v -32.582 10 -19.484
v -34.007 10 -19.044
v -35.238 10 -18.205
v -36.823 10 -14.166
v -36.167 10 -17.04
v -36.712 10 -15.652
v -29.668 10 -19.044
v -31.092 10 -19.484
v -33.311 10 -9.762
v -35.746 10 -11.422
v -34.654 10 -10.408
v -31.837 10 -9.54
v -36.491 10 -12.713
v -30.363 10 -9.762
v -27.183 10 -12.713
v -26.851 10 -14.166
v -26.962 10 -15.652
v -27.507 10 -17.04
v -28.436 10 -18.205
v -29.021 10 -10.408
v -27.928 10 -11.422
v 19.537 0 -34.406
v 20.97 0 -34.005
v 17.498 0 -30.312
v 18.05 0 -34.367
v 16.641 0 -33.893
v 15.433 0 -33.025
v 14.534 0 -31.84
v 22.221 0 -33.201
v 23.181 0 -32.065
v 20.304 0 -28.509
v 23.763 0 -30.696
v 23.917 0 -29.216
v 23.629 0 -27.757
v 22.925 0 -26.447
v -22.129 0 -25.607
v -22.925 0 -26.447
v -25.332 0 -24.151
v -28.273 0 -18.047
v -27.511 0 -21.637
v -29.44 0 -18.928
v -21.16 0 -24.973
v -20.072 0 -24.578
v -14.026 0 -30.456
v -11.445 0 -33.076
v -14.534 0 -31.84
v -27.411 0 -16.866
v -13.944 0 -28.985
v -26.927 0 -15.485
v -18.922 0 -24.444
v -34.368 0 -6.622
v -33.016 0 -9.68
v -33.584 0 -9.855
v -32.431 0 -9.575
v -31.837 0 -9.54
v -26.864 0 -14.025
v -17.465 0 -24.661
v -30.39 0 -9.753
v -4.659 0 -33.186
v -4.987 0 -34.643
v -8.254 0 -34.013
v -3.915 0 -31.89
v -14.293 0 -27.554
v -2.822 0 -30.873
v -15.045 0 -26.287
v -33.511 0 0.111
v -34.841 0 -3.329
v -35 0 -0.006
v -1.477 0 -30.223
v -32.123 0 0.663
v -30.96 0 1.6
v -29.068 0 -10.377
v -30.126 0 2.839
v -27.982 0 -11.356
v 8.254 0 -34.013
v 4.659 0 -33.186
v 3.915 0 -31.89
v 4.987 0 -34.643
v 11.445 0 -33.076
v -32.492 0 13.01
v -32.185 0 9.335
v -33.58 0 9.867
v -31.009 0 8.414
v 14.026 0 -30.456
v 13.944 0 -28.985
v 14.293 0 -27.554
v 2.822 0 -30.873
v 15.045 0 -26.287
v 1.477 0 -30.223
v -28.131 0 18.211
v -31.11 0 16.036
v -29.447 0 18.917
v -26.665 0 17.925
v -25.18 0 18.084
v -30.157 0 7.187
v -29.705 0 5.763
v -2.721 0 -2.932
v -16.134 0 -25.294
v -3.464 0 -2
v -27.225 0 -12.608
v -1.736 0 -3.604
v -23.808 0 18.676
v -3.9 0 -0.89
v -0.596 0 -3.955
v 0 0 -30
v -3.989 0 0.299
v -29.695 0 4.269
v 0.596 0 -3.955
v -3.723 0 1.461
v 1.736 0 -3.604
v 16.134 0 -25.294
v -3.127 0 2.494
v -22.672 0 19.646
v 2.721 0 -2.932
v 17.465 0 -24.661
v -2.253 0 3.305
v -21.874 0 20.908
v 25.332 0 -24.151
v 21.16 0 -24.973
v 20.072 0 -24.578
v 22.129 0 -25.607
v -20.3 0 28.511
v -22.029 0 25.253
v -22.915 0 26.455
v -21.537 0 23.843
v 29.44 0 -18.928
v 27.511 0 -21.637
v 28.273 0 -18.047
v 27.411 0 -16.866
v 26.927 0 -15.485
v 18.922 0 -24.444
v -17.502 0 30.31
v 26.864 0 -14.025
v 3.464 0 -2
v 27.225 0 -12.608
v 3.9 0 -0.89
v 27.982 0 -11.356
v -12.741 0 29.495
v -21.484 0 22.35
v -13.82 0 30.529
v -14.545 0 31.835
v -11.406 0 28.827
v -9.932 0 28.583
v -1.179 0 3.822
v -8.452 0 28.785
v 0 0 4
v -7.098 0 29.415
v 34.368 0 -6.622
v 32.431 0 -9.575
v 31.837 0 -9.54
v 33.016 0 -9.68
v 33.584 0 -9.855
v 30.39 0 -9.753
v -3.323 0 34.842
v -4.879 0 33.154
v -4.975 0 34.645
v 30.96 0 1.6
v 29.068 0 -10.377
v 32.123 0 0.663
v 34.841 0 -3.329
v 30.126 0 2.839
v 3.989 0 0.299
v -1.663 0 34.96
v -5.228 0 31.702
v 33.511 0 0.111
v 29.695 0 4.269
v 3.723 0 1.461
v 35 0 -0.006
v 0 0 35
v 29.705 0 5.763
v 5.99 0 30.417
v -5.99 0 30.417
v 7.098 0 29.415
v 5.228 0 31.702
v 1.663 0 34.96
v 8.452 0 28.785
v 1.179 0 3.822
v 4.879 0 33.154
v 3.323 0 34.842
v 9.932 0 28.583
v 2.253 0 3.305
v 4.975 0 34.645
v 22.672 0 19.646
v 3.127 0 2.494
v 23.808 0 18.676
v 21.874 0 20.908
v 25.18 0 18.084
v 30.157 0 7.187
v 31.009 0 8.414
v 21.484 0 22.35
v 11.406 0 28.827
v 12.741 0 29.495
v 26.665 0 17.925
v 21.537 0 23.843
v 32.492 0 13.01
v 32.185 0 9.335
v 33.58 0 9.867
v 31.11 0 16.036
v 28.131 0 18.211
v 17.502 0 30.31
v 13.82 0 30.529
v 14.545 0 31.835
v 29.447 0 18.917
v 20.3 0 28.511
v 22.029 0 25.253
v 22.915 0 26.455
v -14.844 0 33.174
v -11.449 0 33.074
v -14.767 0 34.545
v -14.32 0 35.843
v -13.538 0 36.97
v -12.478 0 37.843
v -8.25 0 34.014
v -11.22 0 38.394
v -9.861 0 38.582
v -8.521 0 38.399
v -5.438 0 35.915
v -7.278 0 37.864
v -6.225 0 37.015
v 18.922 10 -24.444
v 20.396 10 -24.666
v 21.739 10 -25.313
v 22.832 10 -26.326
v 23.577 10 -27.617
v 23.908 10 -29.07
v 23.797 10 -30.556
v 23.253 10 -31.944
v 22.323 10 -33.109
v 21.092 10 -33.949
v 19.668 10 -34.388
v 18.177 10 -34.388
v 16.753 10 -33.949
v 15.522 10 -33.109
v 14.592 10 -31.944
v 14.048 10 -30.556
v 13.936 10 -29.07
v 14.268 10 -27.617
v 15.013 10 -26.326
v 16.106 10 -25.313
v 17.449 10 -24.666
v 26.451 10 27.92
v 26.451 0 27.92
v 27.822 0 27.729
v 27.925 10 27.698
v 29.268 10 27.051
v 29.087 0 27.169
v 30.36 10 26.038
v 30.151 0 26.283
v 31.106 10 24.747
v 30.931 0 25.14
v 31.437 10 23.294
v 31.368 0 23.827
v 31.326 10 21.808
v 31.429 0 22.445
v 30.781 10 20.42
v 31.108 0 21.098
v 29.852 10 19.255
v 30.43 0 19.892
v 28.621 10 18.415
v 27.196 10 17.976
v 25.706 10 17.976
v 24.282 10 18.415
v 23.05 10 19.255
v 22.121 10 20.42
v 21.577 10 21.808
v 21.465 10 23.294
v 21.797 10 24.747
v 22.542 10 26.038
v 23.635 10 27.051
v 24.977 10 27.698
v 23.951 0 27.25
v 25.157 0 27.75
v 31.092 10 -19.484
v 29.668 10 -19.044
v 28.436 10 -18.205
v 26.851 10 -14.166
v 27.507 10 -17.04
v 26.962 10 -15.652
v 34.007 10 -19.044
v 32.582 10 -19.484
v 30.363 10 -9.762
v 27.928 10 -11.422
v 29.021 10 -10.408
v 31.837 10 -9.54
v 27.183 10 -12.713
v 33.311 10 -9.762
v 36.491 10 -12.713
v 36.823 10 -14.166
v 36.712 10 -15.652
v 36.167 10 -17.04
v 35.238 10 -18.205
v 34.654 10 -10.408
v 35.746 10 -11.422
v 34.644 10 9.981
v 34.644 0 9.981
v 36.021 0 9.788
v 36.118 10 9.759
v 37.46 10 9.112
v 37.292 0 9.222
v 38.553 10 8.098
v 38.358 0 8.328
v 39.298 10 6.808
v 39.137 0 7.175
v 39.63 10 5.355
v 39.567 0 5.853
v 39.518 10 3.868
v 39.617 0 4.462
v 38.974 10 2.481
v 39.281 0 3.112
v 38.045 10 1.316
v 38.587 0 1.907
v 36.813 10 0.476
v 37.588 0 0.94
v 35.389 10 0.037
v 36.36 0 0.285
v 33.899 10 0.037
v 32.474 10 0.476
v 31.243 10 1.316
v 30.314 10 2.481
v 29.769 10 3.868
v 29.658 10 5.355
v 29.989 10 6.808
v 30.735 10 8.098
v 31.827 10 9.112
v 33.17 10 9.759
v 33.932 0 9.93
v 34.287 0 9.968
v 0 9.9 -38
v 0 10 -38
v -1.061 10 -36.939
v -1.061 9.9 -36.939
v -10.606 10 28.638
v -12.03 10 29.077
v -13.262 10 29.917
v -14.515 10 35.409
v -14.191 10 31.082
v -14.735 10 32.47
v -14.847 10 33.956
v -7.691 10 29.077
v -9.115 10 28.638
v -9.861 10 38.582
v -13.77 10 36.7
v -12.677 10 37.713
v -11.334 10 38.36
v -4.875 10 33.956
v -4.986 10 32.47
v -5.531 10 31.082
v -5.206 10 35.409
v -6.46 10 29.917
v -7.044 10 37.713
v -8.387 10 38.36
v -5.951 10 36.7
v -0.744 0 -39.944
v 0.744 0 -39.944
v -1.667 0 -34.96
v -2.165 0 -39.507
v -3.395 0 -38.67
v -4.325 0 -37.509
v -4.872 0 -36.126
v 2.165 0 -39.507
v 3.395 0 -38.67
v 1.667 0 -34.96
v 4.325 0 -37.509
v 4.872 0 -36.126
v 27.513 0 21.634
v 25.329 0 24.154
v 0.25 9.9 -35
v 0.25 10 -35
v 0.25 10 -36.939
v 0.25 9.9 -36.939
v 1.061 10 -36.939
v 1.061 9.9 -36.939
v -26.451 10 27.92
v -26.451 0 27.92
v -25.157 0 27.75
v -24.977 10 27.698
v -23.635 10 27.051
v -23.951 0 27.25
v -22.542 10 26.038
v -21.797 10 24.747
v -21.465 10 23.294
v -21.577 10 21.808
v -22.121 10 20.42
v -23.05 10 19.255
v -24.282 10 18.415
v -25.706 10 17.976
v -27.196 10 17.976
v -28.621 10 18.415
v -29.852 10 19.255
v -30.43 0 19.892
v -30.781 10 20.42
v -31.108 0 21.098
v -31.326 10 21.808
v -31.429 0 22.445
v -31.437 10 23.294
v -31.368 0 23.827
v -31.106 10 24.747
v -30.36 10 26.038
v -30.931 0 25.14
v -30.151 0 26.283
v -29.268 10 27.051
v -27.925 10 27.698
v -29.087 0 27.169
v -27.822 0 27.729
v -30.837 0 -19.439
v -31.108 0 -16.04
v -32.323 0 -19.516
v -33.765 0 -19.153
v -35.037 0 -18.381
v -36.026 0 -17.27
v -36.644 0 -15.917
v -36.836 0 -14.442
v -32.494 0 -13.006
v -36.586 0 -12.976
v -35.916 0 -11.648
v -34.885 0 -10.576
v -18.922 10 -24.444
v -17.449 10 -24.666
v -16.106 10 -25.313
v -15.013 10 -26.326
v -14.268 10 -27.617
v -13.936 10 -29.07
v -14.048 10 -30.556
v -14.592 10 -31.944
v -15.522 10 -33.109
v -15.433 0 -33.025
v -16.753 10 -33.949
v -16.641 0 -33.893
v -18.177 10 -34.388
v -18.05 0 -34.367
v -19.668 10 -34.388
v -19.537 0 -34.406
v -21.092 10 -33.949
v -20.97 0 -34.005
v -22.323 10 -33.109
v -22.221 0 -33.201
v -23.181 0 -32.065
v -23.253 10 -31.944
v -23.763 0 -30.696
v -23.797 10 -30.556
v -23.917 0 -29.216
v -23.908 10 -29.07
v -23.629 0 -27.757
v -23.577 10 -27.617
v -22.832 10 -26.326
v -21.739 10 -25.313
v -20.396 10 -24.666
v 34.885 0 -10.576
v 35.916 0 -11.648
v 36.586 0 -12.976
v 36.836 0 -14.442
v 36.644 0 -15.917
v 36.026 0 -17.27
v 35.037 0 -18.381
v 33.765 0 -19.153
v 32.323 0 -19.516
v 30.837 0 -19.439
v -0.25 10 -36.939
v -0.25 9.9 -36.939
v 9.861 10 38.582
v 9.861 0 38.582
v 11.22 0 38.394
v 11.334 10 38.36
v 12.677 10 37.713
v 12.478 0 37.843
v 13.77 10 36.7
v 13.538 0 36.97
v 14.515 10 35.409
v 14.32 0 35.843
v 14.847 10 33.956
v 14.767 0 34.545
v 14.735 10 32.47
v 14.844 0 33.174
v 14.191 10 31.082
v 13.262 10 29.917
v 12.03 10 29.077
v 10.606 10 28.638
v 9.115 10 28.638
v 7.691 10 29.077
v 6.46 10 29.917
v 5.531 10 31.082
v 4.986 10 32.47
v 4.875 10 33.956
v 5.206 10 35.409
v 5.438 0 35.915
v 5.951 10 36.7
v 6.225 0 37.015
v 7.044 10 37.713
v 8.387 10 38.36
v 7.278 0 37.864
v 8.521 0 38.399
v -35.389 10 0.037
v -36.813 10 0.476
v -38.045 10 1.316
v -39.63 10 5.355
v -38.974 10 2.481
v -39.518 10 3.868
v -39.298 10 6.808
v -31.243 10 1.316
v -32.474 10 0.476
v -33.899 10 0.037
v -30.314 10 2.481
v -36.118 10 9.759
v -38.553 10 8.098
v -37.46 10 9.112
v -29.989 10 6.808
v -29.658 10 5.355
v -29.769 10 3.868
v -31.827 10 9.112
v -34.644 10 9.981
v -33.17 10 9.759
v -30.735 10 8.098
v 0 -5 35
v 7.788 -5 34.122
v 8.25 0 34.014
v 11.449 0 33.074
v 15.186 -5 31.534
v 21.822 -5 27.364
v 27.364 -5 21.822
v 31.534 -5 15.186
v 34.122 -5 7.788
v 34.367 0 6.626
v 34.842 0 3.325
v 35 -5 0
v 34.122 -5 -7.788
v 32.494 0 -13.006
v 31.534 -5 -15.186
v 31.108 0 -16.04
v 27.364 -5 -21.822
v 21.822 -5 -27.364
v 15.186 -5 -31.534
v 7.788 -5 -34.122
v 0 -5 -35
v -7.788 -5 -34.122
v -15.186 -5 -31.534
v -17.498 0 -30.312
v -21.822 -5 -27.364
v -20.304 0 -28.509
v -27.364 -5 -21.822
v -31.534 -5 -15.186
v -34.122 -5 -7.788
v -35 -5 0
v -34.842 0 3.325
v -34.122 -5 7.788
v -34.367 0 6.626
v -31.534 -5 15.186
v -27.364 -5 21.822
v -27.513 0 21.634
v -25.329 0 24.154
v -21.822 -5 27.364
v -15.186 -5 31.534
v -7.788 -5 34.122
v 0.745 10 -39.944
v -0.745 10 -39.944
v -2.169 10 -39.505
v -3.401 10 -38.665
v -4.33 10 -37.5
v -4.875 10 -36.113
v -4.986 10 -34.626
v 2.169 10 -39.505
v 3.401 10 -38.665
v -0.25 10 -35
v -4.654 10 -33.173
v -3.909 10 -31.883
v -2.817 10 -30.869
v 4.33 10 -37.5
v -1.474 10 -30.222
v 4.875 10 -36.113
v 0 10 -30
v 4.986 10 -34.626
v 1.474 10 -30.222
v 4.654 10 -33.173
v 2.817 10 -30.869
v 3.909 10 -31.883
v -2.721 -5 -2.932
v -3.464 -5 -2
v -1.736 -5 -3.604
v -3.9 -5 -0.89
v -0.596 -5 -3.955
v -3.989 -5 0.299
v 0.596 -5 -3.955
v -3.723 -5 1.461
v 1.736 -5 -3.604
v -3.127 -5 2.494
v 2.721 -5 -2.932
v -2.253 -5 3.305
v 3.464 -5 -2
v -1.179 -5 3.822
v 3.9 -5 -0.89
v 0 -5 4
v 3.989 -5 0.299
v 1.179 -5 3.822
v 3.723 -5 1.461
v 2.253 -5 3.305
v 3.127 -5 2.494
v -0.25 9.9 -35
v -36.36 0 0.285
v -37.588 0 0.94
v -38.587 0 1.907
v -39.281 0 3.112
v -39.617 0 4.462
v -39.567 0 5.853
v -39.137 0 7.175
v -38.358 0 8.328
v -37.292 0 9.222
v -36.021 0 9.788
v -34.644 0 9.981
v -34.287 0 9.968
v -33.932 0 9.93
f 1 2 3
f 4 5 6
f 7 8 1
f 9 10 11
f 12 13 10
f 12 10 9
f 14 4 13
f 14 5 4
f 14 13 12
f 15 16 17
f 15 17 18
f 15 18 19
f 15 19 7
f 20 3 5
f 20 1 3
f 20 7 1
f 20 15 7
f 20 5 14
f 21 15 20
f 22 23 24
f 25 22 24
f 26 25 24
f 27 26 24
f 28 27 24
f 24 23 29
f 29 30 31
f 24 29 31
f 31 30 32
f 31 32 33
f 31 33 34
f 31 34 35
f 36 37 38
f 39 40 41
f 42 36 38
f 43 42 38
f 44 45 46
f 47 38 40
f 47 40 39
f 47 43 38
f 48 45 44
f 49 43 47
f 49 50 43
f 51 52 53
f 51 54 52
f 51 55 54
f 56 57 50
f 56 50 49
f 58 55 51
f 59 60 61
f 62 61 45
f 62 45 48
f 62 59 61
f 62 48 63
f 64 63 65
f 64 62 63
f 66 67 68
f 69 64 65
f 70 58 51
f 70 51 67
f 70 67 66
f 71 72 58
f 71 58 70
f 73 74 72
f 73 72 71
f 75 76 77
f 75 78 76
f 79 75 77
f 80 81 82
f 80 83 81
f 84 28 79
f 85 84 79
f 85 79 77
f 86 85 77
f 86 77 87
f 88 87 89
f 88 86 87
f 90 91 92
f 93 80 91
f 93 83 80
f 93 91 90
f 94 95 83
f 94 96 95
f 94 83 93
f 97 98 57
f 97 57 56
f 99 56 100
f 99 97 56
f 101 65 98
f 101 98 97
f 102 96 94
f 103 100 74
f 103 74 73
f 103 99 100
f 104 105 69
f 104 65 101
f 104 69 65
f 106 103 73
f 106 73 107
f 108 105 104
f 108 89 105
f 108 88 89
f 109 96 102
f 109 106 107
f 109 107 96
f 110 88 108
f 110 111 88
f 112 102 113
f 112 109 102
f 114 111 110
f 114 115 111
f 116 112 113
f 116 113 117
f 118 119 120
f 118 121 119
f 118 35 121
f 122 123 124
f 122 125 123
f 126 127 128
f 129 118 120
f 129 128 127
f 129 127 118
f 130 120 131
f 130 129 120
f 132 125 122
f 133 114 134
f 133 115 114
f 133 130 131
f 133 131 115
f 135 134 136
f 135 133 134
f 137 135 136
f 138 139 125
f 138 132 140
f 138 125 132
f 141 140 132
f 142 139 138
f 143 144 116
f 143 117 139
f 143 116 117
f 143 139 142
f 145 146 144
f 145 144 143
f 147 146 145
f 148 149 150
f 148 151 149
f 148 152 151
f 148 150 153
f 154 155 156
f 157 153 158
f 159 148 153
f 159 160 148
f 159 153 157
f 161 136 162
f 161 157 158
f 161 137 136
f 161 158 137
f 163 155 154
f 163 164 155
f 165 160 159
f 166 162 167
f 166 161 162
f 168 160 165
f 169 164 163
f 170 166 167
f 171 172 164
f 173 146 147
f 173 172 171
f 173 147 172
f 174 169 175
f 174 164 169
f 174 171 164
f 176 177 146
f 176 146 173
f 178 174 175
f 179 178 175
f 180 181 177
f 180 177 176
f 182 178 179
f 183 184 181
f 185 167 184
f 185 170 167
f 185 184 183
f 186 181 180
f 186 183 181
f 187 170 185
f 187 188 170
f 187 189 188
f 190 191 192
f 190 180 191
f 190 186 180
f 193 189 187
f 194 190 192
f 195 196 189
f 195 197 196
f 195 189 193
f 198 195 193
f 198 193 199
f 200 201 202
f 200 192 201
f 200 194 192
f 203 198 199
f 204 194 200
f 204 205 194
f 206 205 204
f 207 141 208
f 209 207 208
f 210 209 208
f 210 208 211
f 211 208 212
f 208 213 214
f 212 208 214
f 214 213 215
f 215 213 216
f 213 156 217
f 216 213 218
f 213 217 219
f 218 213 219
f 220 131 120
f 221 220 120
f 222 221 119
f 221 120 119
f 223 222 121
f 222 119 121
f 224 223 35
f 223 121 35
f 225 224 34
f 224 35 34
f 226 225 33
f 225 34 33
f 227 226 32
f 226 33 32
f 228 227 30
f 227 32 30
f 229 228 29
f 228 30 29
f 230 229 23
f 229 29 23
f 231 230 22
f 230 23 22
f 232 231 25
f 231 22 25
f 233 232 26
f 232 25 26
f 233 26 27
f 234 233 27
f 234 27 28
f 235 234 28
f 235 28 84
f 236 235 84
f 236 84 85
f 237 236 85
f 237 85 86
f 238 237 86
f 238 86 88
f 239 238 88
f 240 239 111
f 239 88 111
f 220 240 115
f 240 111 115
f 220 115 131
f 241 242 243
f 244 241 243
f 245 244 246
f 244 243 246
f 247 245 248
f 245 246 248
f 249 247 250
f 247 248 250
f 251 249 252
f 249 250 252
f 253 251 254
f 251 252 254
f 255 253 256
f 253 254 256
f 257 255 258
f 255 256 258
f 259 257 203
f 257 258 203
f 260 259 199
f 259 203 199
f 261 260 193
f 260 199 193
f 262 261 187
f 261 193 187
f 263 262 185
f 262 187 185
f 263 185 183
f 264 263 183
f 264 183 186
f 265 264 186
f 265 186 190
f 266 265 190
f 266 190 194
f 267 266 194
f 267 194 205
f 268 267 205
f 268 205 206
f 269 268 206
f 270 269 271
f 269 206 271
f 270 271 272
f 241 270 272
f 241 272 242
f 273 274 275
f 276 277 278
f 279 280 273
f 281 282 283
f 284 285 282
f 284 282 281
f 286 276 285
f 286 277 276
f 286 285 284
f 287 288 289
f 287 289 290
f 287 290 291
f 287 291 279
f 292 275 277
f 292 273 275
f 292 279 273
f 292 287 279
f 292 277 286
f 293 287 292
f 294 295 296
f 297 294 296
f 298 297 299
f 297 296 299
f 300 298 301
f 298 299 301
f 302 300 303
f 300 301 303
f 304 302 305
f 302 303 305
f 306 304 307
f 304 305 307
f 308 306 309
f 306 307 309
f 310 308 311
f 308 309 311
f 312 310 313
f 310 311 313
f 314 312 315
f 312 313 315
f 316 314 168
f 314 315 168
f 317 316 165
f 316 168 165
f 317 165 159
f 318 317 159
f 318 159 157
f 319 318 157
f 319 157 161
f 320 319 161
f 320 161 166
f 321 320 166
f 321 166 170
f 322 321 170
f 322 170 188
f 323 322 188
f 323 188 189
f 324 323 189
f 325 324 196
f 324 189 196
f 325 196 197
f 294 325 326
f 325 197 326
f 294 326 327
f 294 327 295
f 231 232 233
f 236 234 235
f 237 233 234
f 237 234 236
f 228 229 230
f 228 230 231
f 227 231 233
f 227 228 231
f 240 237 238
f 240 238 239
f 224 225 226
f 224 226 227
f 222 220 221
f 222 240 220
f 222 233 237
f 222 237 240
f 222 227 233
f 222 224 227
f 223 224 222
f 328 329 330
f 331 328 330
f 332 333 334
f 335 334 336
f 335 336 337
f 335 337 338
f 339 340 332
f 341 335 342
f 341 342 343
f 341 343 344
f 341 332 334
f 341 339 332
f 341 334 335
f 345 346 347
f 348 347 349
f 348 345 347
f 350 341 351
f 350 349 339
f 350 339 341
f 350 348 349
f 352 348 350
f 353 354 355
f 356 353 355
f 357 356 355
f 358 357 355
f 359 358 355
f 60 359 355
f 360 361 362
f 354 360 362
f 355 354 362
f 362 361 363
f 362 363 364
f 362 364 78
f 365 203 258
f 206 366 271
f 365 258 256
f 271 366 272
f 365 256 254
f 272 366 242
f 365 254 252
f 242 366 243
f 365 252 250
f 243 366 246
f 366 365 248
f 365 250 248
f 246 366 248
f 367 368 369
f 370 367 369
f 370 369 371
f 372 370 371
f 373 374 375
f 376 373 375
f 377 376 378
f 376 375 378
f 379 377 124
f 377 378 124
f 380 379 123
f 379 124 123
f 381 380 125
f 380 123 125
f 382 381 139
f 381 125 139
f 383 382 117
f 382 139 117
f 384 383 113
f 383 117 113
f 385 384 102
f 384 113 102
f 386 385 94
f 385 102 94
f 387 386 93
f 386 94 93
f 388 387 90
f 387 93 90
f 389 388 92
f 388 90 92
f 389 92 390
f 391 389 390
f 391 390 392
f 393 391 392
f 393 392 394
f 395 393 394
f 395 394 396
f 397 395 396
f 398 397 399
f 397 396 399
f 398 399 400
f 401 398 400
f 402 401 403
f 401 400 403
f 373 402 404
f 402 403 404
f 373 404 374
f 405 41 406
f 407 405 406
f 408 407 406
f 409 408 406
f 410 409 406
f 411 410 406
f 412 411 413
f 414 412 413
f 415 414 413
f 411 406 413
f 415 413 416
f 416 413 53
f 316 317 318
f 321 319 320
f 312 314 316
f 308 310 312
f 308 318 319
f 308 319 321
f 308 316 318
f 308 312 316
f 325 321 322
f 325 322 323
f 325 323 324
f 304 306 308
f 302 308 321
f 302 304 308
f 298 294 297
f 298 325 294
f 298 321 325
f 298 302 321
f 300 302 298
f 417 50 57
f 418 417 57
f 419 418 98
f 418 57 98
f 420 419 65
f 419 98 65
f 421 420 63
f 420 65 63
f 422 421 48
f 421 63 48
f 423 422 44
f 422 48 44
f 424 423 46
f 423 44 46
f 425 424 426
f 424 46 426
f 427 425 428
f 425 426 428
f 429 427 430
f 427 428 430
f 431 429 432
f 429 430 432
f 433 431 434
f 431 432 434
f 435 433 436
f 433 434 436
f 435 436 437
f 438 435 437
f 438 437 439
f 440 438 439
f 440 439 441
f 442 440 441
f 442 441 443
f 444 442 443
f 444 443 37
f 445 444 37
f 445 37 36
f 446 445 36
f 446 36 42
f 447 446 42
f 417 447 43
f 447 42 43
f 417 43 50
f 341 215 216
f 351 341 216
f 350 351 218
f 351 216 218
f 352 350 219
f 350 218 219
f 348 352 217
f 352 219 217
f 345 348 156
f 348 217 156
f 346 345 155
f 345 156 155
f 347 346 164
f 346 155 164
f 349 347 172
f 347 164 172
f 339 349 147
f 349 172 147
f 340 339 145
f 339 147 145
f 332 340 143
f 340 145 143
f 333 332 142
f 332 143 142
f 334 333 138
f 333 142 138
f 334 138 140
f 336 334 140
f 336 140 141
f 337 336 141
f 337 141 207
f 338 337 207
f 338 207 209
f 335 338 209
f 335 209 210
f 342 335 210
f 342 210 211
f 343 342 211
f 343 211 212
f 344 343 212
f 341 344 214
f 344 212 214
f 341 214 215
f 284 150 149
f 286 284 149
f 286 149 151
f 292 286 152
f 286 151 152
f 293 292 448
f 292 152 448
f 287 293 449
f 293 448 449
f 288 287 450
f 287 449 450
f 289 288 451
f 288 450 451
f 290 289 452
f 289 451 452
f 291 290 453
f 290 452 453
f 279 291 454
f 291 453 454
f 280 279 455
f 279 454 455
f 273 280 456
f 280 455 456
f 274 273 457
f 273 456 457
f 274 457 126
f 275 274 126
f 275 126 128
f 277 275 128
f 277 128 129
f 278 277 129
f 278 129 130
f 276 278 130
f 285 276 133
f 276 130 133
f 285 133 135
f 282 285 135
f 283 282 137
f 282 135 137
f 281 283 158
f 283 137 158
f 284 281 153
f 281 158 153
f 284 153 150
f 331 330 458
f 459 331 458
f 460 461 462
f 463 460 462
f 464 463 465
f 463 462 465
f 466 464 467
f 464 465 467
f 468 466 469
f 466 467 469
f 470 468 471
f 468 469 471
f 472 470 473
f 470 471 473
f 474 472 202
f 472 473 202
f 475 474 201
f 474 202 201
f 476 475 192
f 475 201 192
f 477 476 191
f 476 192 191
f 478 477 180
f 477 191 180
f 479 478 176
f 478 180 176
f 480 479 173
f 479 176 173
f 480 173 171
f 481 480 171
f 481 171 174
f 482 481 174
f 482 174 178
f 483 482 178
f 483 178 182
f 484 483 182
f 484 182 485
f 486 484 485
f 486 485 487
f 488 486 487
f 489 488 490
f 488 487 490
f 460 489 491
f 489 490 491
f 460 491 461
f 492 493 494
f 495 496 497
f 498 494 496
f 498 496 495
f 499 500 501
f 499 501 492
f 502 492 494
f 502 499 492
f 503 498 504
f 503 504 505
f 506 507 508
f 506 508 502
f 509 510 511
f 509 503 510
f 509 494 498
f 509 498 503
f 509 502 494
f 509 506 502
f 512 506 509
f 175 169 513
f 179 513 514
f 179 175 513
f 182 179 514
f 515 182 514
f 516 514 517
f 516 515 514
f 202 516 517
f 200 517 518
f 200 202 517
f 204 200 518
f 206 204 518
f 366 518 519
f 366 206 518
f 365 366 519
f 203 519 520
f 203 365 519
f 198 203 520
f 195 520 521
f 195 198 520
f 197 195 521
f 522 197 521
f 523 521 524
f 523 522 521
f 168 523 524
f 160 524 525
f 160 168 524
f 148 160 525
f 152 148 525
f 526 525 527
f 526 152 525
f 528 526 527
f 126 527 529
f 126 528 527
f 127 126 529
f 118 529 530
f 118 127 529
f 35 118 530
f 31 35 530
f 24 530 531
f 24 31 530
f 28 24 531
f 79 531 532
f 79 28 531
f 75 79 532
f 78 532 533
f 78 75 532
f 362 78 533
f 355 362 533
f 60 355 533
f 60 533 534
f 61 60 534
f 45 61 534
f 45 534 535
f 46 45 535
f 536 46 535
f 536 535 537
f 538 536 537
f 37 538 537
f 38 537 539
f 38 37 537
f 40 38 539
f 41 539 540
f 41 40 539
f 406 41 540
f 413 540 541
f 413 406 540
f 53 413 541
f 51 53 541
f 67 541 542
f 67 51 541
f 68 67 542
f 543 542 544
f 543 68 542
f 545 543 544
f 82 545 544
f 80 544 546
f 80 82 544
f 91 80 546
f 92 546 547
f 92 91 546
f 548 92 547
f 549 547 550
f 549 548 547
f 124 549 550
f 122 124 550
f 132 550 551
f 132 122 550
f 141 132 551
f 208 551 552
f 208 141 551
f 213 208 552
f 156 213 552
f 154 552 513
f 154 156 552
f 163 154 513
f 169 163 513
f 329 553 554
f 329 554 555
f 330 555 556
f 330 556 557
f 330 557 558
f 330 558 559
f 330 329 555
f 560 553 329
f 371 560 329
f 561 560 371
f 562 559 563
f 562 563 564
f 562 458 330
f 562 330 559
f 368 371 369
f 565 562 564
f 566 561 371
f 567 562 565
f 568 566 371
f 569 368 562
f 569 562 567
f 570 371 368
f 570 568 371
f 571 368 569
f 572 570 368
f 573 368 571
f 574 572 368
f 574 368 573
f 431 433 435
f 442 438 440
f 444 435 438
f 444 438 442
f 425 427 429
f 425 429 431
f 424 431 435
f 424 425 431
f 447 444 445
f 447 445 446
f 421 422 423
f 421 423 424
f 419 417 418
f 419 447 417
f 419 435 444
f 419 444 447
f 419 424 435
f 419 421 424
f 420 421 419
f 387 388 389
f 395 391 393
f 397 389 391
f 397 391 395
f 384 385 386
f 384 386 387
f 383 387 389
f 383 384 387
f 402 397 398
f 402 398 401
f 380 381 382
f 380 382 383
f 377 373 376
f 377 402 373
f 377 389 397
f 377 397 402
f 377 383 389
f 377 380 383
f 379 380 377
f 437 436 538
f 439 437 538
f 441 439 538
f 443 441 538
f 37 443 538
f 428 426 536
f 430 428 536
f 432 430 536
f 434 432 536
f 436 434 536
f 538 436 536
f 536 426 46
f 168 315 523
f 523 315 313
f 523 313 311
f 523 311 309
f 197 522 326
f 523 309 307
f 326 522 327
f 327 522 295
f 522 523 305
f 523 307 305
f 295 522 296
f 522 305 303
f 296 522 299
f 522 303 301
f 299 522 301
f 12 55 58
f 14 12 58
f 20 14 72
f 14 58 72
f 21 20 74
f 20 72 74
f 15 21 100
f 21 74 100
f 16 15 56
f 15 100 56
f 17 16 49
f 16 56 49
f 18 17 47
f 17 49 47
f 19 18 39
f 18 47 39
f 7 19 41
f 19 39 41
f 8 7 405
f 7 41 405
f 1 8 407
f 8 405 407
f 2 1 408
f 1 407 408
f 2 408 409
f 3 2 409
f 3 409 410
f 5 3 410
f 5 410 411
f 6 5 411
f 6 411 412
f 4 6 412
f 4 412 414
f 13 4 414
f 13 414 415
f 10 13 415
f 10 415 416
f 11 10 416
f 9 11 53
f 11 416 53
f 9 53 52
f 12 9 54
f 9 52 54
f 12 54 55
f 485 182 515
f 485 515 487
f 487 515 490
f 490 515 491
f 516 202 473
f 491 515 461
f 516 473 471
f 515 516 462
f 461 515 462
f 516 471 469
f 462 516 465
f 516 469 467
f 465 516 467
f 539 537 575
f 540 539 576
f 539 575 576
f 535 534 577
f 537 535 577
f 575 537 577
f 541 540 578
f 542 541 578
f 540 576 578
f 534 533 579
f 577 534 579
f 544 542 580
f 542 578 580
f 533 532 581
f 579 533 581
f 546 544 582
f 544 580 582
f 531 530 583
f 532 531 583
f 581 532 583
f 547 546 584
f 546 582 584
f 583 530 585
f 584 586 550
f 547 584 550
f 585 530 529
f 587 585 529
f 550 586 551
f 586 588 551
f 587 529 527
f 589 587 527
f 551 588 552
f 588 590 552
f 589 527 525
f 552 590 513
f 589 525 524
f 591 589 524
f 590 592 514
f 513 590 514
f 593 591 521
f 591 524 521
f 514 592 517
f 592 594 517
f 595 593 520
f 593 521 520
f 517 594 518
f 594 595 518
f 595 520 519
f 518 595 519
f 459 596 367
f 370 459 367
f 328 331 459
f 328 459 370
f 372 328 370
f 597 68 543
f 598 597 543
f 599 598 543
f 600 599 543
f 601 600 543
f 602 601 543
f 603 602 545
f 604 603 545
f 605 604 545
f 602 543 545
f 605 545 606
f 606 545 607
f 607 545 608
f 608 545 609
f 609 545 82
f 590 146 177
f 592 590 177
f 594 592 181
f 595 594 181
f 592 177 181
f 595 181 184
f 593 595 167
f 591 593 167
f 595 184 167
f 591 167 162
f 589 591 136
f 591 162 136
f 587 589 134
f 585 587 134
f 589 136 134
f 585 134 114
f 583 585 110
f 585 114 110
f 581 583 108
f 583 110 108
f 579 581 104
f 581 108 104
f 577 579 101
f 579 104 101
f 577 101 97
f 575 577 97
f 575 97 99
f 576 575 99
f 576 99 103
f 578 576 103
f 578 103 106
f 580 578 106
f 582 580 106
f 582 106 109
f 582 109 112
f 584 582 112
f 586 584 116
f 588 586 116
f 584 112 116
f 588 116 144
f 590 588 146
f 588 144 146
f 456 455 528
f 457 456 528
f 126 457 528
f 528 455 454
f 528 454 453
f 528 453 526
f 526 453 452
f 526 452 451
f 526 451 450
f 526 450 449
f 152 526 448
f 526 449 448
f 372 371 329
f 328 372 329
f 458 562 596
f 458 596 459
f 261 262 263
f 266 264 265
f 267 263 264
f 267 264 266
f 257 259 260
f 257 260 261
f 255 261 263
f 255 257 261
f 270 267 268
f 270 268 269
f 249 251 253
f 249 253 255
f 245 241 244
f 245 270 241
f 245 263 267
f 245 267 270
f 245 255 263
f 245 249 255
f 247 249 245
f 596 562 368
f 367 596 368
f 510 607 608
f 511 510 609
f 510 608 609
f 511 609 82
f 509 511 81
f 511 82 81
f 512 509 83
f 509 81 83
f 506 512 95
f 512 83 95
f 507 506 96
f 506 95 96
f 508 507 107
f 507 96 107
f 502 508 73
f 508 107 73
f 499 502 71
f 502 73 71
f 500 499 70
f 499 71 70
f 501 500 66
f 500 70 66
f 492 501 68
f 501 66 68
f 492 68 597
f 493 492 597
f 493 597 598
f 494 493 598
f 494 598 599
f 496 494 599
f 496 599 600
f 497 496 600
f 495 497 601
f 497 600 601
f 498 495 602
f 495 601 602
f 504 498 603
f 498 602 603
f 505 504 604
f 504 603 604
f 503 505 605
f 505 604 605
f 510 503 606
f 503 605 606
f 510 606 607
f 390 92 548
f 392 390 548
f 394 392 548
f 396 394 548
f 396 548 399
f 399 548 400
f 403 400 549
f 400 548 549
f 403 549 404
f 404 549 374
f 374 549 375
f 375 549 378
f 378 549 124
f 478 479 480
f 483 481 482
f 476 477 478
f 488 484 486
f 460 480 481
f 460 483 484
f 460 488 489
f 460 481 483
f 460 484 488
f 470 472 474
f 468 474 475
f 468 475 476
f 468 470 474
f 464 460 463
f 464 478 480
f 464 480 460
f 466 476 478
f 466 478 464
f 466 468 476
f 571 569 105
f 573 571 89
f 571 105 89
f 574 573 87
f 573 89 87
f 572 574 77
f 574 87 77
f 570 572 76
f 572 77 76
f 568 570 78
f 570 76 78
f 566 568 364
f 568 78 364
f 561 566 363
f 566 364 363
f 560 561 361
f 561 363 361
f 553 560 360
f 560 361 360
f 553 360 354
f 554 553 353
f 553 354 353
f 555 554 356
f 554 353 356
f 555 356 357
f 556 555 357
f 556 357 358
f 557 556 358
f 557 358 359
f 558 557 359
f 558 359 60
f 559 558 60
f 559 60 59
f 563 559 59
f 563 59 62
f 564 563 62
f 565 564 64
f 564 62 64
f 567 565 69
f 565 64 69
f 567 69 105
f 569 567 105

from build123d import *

# Parameters (mm, degrees)
SKETCH1_R              = 5
BOSS_EXTRUDE1_DEPTH    = 10
BOSS_EXTRUDE1_2_DEPTH  = 10
BOSS_EXTRUDE1_3_DEPTH  = 10
BOSS_EXTRUDE1_4_DEPTH  = 10
BOSS_EXTRUDE1_5_DEPTH  = 10
BOSS_EXTRUDE1_6_DEPTH  = 10
BOSS_EXTRUDE1_7_DEPTH  = 10
BOSS_EXTRUDE1_8_DEPTH  = 10
BOSS_EXTRUDE1_9_DEPTH  = 10
BOSS_EXTRUDE1_10_DEPTH = 10
BOSS_EXTRUDE1_11_DEPTH = 10
SKETCH2_R              = 35
SKETCH2_R_2            = 4
BOSS_EXTRUDE2_DEPTH    = 5
SKETCH3_W              = 0.25
SKETCH3_H              = 1.939339828
CUT_EXTRUDE1_DEPTH     = 0.1


with BuildPart() as part:
    # Sketch1 → Boss-Extrude1 (new body)
    with BuildSketch(Plane(origin=(0, 0, 0), x_dir=(1, 0, 0), z_dir=(0, 1, 0))):
        with Locations(Location((0, 35, 0), (0, 0, 270))):
            Circle(SKETCH1_R)
    extrude(amount=BOSS_EXTRUDE1_DEPTH)



with BuildPart() as body_2:
    # Sketch1 → Boss-Extrude1 2 (new body)
    with BuildSketch(Plane(origin=(0, 0, 0), x_dir=(1, 0, 0), z_dir=(0, 1, 0))):
        with Locations(Location((18.922428611, 29.443873649, 0), (0, 0, 270))):
            Circle(SKETCH1_R)
    extrude(amount=BOSS_EXTRUDE1_2_DEPTH)


with BuildPart() as body_3:
    # Sketch1 → Boss-Extrude1 3 (new body)
    with BuildSketch(Plane(origin=(0, 0, 0), x_dir=(1, 0, 0), z_dir=(0, 1, 0))):
        with Locations(Location((31.837119837, 14.539525455, 0), (0, 0, 270))):
            Circle(SKETCH1_R)
    extrude(amount=BOSS_EXTRUDE1_3_DEPTH)


with BuildPart() as body_4:
    # Sketch1 → Boss-Extrude1 4 (new body)
    with BuildSketch(Plane(origin=(0, 0, 0), x_dir=(1, 0, 0), z_dir=(0, 1, 0))):
        with Locations(Location((34.643750466, -4.98101934, 0), (0, 0, 270))):
            Circle(SKETCH1_R)
    extrude(amount=BOSS_EXTRUDE1_4_DEPTH)


with BuildPart() as body_5:
    # Sketch1 → Boss-Extrude1 5 (new body)
    with BuildSketch(Plane(origin=(0, 0, 0), x_dir=(1, 0, 0), z_dir=(0, 1, 0))):
        with Locations(Location((26.451235102, -22.920125688, 0), (0, 0, 270))):
            Circle(SKETCH1_R)
    extrude(amount=BOSS_EXTRUDE1_5_DEPTH)


with BuildPart() as body_6:
    # Sketch1 → Boss-Extrude1 6 (new body)
    with BuildSketch(Plane(origin=(0, 0, 0), x_dir=(1, 0, 0), z_dir=(0, 1, 0))):
        with Locations(Location((9.860639489, -33.582254077, 0), (0, 0, 270))):
            Circle(SKETCH1_R)
    extrude(amount=BOSS_EXTRUDE1_6_DEPTH)


with BuildPart() as body_7:
    # Sketch1 → Boss-Extrude1 7 (new body)
    with BuildSketch(Plane(origin=(0, 0, 0), x_dir=(1, 0, 0), z_dir=(0, 1, 0))):
        with Locations(Location((-9.860639489, -33.582254077, 0), (0, 0, 270))):
            Circle(SKETCH1_R)
    extrude(amount=BOSS_EXTRUDE1_7_DEPTH)


with BuildPart() as body_8:
    # Sketch1 → Boss-Extrude1 8 (new body)
    with BuildSketch(Plane(origin=(0, 0, 0), x_dir=(1, 0, 0), z_dir=(0, 1, 0))):
        with Locations(Location((-26.451235102, -22.920125688, 0), (0, 0, 270))):
            Circle(SKETCH1_R)
    extrude(amount=BOSS_EXTRUDE1_8_DEPTH)


with BuildPart() as body_9:
    # Sketch1 → Boss-Extrude1 9 (new body)
    with BuildSketch(Plane(origin=(0, 0, 0), x_dir=(1, 0, 0), z_dir=(0, 1, 0))):
        with Locations(Location((-34.643750466, -4.98101934, 0), (0, 0, 270))):
            Circle(SKETCH1_R)
    extrude(amount=BOSS_EXTRUDE1_9_DEPTH)


with BuildPart() as body_10:
    # Sketch1 → Boss-Extrude1 10 (new body)
    with BuildSketch(Plane(origin=(0, 0, 0), x_dir=(1, 0, 0), z_dir=(0, 1, 0))):
        with Locations(Location((-31.837119837, 14.539525455, 0), (0, 0, 270))):
            Circle(SKETCH1_R)
    extrude(amount=BOSS_EXTRUDE1_10_DEPTH)


with BuildPart() as body_11:
    # Sketch1 → Boss-Extrude1 11 (new body)
    with BuildSketch(Plane(origin=(0, 0, 0), x_dir=(1, 0, 0), z_dir=(0, 1, 0))):
        with Locations(Location((-18.922428611, 29.443873649, 0), (0, 0, 270))):
            Circle(SKETCH1_R)
    extrude(amount=BOSS_EXTRUDE1_11_DEPTH)


with BuildPart() as part_1:
    add(part.part)

    add(body_2.part)  # Boss-Extrude2 merges body 2

    add(body_3.part)  # Boss-Extrude2 merges body 3

    add(body_4.part)  # Boss-Extrude2 merges body 4

    add(body_5.part)  # Boss-Extrude2 merges body 5

    add(body_6.part)  # Boss-Extrude2 merges body 6

    add(body_7.part)  # Boss-Extrude2 merges body 7

    add(body_8.part)  # Boss-Extrude2 merges body 8

    add(body_9.part)  # Boss-Extrude2 merges body 9

    add(body_10.part)  # Boss-Extrude2 merges body 10

    add(body_11.part)  # Boss-Extrude2 merges body 11
    # Sketch2 → Boss-Extrude2 (add)
    with BuildSketch(Plane(origin=(0, 0, 0), x_dir=(1, 0, 0), z_dir=(0, 1, 0))):
        with Locations(Location((0, 0, 0), (0, 0, 270))):
            Circle(SKETCH2_R)
        with Locations(Location((0, 0, 0), (0, 0, 270))):
            Circle(SKETCH2_R_2, mode=Mode.SUBTRACT)
    extrude(amount=-BOSS_EXTRUDE2_DEPTH)

    # Sketch3 → Cut-Extrude1 (cut)
    with BuildSketch(Plane(origin=(0, 10, 0), x_dir=(1, 0, 0), z_dir=(0, 1, 0))):
        Polygon((-1.060660172, 36.939339828), (-0.25, 36.939339828), (-0.25, 37.75), align=None)
        Polygon((-0.25, 36.939339828), (0, 36.939339828), (0, 38), (-0.25, 37.75), align=None)
        Polygon((0, 38), (0, 36.939339828), (0.25, 36.939339828), (0.25, 37.75), align=None)
        Polygon((0.25, 37.75), (0.25, 36.939339828), (1.060660172, 36.939339828), align=None)
        with Locations((0.125, 35.969669914)):
            Rectangle(SKETCH3_W, SKETCH3_H)
        with Locations((-0.125, 35.969669914)):
            Rectangle(SKETCH3_W, SKETCH3_H)
    extrude(amount=-CUT_EXTRUDE1_DEPTH, mode=Mode.SUBTRACT)


solid = part_1.part
